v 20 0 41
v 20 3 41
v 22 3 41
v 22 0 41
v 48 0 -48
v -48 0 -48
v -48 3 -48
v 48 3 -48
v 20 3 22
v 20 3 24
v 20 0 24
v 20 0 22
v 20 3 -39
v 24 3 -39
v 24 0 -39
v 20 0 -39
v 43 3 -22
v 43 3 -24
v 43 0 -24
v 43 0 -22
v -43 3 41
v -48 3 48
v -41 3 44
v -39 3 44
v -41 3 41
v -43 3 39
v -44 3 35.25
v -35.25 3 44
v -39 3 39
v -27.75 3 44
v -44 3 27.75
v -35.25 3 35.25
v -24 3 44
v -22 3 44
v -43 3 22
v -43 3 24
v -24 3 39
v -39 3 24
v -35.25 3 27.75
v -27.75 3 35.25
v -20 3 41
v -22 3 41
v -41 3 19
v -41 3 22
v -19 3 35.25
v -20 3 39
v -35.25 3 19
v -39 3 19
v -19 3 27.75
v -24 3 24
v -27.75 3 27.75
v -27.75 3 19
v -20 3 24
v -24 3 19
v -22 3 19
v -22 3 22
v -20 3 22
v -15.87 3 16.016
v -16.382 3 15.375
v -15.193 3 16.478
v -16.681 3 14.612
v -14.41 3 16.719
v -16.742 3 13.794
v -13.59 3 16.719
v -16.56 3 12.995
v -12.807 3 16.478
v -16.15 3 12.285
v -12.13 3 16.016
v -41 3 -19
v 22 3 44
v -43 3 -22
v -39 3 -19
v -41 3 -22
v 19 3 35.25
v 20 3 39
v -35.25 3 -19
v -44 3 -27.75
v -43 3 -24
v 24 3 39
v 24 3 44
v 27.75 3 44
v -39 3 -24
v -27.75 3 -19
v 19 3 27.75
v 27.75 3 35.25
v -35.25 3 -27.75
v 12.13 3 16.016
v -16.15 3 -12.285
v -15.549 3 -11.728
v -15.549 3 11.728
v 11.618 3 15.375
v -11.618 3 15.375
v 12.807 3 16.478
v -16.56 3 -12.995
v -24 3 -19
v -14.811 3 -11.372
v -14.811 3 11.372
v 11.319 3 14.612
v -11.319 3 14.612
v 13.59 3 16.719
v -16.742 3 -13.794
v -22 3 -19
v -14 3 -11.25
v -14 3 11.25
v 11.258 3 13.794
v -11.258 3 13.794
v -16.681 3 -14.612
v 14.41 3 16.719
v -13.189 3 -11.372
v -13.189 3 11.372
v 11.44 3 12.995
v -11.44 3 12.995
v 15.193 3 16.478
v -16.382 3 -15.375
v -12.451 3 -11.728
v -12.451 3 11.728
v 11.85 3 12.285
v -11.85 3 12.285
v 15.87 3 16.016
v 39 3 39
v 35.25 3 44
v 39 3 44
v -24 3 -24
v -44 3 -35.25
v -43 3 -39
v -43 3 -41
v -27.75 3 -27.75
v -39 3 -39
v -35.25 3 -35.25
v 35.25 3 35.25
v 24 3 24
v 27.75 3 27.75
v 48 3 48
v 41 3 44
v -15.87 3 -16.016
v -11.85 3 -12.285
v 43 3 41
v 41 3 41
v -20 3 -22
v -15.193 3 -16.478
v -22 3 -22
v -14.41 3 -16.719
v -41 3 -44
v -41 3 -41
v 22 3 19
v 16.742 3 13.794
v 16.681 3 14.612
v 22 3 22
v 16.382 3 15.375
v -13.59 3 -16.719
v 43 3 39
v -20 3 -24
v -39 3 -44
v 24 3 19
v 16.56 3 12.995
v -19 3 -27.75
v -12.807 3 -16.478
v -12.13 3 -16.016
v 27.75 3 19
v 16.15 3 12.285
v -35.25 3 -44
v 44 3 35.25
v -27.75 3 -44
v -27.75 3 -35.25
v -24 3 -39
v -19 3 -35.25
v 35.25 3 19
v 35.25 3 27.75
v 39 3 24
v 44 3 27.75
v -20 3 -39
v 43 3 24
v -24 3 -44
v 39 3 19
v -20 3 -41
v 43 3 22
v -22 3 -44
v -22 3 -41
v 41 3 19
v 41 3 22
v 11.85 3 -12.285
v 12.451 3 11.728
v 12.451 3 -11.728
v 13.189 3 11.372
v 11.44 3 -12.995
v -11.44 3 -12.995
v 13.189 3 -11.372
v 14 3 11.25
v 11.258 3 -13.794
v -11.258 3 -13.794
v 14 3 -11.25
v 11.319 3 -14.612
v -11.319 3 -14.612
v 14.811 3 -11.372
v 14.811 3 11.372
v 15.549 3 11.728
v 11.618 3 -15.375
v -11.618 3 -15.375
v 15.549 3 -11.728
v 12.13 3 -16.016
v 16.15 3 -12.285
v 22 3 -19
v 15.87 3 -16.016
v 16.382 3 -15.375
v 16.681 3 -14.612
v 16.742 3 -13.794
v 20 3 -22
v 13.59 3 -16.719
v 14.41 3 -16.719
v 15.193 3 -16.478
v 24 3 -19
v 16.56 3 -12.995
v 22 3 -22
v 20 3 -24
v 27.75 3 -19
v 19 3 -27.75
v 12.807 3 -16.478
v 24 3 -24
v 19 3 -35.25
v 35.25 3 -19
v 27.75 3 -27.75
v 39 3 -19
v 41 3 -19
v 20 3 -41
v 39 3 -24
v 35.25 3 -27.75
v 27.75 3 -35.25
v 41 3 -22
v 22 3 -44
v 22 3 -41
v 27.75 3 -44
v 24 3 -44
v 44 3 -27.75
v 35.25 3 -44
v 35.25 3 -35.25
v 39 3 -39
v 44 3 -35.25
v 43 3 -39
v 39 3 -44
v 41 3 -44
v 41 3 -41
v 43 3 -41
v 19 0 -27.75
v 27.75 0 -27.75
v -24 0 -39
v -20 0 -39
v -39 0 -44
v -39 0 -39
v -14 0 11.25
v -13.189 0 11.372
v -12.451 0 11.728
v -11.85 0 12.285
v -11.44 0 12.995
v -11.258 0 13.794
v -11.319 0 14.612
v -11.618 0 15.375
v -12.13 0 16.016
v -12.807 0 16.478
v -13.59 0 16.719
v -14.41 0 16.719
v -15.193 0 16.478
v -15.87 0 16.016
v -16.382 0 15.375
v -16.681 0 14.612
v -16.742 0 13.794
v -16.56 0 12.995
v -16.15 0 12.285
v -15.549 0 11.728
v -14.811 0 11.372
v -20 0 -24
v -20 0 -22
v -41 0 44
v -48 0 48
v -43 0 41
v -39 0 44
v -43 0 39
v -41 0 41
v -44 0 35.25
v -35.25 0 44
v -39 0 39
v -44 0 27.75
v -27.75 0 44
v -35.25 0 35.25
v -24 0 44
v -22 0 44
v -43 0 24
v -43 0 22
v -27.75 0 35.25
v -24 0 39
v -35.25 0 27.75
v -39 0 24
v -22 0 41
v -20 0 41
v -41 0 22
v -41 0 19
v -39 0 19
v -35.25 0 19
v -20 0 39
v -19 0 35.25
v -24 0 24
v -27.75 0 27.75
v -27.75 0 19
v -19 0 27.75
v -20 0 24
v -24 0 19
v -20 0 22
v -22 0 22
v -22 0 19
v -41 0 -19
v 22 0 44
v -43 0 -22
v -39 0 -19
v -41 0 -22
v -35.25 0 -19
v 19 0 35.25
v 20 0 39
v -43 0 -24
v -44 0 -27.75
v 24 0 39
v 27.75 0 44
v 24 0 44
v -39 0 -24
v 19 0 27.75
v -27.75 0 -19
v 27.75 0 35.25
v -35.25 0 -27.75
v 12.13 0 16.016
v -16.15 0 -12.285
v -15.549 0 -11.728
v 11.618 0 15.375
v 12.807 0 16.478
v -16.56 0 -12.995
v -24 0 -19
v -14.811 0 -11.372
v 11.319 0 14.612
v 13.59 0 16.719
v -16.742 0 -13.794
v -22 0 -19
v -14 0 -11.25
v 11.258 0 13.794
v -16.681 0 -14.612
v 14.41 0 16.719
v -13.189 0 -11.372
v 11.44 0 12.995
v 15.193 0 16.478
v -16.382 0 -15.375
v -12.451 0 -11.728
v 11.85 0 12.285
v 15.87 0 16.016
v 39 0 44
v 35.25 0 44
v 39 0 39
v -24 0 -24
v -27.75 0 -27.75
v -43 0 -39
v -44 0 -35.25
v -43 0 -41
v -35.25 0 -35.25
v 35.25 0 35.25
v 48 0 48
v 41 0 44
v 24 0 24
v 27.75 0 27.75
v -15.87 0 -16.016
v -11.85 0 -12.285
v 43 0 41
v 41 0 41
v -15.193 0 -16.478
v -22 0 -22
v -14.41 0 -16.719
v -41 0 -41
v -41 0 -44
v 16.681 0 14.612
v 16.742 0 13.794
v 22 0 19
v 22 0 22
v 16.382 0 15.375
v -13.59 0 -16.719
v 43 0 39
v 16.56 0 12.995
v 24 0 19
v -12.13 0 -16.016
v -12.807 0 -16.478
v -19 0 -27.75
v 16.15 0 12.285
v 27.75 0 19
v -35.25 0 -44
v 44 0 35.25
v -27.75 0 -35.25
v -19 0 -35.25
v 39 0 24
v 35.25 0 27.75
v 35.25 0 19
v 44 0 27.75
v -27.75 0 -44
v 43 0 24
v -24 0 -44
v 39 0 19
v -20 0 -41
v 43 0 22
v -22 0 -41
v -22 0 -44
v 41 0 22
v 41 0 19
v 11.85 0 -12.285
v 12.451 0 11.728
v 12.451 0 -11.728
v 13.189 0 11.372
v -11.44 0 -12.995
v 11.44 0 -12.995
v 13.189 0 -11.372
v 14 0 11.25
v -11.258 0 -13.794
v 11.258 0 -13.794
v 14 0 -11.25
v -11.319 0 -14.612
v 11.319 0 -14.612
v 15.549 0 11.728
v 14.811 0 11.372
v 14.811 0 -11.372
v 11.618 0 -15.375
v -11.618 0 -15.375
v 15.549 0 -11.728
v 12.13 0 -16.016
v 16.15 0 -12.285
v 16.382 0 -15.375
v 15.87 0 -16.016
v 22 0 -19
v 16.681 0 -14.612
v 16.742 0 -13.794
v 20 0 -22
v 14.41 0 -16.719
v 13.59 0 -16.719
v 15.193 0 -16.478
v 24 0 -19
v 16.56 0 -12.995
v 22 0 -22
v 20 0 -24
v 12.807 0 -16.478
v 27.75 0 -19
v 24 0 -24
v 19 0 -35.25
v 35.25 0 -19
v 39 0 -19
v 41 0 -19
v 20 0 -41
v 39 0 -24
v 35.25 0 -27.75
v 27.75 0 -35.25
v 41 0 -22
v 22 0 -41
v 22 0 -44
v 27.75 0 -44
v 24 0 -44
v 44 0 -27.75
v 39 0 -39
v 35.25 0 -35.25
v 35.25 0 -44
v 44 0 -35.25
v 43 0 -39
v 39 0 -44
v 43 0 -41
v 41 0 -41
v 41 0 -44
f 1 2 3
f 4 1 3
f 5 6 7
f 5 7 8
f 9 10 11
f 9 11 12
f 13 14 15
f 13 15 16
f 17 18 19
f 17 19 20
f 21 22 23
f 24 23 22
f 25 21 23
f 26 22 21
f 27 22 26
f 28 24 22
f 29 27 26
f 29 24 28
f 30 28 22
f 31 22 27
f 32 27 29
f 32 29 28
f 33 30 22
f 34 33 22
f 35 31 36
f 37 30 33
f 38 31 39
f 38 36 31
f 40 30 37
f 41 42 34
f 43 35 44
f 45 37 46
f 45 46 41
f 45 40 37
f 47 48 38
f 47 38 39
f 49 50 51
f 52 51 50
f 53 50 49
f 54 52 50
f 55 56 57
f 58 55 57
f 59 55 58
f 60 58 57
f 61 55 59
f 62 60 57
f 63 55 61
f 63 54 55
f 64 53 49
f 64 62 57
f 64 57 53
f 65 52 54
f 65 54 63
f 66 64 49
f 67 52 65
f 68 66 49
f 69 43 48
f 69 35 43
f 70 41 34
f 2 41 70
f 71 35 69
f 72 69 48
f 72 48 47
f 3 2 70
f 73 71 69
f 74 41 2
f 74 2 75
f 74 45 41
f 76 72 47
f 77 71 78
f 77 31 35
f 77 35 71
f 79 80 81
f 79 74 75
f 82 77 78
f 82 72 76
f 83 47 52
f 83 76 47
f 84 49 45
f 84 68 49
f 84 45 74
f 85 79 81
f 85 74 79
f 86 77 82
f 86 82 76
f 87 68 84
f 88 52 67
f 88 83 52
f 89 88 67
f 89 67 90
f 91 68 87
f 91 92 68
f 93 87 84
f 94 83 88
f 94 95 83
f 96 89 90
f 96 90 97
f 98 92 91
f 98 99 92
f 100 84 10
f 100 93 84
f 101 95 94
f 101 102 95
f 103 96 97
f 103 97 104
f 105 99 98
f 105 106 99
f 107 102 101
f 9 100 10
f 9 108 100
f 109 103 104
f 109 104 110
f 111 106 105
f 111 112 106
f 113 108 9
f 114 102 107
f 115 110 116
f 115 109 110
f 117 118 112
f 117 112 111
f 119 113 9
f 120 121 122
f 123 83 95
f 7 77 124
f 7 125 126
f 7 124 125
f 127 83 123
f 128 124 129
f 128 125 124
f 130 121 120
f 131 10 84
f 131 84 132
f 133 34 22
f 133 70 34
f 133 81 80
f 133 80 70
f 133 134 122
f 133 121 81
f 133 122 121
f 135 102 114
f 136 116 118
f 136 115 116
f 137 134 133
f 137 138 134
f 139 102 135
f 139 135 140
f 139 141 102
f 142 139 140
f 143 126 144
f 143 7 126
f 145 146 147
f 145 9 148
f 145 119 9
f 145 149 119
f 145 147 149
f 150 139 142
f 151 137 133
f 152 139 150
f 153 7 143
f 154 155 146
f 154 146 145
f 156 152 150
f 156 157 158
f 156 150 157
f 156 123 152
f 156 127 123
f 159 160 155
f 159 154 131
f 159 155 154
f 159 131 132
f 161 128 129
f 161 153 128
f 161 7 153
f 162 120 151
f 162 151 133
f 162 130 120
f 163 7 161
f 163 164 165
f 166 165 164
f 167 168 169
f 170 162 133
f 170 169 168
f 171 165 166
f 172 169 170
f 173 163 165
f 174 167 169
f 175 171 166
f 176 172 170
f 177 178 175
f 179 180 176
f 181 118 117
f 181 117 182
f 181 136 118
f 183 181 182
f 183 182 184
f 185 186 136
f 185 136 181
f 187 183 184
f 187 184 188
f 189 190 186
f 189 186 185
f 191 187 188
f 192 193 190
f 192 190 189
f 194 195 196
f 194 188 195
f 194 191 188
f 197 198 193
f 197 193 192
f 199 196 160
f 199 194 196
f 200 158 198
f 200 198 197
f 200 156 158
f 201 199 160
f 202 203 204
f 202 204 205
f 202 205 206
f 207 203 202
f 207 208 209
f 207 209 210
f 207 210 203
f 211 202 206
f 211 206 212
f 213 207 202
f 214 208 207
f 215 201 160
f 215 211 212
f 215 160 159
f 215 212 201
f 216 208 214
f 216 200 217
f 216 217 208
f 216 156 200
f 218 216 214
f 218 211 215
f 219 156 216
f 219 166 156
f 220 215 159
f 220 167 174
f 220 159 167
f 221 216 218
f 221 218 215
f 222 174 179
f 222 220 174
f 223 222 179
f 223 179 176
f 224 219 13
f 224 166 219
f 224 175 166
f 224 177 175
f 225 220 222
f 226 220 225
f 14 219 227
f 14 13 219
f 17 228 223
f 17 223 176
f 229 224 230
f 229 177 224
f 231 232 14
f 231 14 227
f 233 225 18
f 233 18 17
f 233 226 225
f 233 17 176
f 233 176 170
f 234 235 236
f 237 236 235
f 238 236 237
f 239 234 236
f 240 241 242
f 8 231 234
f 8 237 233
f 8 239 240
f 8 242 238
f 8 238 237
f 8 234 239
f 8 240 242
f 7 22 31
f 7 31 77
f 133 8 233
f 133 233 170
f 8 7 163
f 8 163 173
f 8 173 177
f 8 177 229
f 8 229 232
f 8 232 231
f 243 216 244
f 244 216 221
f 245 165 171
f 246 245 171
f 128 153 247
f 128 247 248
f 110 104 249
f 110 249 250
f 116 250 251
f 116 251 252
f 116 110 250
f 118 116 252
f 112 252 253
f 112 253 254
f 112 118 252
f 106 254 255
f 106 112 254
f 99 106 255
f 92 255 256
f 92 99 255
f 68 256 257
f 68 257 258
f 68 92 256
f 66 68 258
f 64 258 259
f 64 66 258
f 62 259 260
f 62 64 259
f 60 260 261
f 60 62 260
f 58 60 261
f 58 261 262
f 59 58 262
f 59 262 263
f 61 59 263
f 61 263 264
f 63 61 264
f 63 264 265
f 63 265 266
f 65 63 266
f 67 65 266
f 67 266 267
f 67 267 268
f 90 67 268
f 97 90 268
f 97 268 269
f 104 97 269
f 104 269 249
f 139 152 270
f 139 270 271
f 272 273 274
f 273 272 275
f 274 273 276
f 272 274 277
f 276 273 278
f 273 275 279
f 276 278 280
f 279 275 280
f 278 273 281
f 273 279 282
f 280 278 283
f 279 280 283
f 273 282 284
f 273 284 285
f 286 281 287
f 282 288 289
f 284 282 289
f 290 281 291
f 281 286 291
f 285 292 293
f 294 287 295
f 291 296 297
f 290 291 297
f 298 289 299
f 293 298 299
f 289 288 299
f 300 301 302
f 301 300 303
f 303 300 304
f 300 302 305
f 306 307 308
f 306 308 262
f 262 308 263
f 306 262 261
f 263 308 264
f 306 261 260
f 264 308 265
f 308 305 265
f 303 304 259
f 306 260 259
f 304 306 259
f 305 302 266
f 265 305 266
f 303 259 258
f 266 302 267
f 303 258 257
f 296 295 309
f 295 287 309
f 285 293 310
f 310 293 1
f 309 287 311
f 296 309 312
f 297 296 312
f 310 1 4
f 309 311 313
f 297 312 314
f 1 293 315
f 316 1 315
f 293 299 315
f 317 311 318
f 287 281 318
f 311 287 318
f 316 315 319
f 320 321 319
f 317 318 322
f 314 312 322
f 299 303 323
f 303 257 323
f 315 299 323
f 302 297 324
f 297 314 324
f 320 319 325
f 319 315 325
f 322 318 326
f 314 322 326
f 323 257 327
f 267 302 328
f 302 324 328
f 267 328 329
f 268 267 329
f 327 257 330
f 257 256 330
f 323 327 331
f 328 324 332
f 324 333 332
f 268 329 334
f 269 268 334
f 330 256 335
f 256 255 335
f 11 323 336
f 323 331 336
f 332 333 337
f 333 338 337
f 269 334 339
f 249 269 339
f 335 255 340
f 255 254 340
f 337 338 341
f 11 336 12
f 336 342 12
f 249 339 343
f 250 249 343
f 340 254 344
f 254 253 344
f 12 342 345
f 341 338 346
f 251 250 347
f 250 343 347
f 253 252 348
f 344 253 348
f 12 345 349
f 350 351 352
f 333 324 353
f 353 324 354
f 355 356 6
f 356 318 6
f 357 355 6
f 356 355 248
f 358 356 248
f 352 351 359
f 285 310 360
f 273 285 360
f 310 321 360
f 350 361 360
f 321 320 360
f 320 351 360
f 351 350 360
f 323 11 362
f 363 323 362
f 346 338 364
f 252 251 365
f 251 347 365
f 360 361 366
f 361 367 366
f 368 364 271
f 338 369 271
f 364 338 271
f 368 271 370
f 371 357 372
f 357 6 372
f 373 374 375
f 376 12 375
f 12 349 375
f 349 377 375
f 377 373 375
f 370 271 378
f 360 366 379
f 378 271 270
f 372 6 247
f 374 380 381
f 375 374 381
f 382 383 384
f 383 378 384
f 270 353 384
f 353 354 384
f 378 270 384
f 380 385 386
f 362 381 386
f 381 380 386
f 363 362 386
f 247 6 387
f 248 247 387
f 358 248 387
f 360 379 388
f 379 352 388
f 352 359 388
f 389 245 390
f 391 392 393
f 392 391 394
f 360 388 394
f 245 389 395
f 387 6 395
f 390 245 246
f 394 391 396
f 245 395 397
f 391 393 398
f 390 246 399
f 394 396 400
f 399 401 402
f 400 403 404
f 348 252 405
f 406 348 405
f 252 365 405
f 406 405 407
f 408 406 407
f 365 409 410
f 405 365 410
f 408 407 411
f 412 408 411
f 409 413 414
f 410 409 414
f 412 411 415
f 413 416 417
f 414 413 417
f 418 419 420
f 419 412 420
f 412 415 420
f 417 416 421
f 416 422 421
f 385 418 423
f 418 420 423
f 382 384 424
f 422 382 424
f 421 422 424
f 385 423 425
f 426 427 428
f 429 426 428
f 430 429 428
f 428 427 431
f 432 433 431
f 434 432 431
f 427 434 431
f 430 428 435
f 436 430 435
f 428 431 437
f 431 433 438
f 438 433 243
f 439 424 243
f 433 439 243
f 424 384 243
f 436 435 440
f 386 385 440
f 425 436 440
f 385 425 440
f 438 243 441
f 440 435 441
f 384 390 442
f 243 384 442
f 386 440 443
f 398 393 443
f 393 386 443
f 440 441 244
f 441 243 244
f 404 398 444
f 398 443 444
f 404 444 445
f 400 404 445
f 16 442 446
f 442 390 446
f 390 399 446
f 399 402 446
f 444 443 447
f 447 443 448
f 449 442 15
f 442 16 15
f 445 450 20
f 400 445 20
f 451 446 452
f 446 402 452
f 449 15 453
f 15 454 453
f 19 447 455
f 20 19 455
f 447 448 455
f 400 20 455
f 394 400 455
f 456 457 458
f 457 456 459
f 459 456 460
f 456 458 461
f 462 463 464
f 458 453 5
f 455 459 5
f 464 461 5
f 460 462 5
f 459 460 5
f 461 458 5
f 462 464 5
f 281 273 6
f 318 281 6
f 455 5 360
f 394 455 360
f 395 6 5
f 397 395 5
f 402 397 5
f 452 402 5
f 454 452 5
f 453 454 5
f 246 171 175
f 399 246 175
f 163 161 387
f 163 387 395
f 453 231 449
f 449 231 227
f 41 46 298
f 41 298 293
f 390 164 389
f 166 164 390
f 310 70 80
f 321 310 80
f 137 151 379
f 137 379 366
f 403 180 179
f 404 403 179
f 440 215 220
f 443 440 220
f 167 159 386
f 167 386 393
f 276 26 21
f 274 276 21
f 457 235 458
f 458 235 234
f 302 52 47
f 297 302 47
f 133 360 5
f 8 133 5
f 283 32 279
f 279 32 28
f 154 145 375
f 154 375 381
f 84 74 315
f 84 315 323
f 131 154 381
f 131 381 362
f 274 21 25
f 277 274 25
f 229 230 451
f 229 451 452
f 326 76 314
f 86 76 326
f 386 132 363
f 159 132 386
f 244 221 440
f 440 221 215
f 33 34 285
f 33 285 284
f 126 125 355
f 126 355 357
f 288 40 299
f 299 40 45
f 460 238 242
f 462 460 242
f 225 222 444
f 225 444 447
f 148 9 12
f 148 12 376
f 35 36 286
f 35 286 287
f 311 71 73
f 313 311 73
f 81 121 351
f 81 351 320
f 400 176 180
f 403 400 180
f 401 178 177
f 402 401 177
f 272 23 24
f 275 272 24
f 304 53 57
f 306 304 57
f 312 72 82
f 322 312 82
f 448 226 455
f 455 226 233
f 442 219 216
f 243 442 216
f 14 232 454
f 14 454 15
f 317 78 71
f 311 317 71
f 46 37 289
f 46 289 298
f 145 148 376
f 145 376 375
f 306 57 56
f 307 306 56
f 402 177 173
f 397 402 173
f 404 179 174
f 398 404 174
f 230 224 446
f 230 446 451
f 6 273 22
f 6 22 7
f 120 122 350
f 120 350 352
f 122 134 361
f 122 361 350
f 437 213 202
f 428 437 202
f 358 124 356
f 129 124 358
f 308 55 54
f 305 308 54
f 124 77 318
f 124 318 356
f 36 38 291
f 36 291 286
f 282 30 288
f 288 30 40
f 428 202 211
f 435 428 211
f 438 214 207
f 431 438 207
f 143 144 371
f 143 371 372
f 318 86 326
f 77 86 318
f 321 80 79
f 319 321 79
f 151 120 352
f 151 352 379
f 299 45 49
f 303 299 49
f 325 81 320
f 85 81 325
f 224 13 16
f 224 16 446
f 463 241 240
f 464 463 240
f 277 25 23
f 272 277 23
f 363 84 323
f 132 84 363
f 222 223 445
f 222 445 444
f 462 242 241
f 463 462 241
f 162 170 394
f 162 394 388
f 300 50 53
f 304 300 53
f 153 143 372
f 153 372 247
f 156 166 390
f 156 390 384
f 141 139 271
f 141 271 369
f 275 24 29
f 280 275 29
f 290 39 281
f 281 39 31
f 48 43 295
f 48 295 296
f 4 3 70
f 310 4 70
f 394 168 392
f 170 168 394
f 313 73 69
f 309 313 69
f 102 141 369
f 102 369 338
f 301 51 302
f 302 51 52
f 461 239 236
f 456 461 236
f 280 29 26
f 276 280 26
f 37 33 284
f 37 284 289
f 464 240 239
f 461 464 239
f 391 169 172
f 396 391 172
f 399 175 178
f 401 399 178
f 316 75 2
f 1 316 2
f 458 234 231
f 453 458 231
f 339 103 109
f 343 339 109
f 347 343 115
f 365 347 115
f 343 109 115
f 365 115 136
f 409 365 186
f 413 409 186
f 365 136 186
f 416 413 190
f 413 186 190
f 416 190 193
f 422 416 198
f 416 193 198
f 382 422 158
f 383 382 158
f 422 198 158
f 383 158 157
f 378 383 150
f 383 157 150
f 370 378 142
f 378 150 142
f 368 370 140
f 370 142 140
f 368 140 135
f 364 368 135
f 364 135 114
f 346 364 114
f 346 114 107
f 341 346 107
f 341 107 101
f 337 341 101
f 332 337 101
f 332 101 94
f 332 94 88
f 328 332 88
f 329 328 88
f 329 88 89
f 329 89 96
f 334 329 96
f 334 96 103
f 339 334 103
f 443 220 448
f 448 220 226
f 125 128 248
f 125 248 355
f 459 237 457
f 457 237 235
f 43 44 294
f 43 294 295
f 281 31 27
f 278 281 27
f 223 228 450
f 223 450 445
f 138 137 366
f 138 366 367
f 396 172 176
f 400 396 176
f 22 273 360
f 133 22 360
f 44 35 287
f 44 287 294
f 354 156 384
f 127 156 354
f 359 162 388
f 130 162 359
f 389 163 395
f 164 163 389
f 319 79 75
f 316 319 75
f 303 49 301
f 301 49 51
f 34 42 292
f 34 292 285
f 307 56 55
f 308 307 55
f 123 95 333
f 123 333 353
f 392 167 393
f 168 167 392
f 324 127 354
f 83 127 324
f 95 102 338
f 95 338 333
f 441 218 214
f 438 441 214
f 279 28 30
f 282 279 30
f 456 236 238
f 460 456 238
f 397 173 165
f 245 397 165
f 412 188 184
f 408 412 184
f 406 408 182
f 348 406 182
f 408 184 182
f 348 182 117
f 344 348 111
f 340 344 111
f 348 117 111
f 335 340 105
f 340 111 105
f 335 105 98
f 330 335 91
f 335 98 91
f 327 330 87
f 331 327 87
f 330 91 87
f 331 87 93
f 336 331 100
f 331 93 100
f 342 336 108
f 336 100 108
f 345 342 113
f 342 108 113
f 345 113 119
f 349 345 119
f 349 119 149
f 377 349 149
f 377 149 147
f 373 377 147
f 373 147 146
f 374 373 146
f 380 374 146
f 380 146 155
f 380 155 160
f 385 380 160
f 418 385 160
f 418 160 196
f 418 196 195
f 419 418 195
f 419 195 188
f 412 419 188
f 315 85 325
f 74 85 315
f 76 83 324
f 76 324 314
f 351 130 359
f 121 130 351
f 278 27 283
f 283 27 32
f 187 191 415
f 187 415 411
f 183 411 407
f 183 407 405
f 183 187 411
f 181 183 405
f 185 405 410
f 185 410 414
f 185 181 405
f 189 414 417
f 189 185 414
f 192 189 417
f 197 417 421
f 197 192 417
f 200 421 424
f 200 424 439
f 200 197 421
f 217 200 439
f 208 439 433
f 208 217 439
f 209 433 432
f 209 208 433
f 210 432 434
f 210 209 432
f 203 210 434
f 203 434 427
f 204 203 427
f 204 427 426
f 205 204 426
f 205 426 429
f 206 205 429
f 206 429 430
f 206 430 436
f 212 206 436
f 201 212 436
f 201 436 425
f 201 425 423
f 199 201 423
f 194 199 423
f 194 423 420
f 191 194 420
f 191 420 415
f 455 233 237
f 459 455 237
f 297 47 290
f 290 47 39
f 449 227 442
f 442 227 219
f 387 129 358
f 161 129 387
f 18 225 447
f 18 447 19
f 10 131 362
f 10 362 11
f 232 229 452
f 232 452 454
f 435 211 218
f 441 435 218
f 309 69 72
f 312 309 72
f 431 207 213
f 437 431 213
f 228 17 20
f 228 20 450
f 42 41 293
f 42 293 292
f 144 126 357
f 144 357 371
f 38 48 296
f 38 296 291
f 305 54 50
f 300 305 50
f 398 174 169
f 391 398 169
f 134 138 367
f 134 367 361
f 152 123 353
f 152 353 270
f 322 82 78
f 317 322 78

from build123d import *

# Parameters (mm, degrees)
SKETCH_1_W               = 96
SKETCH_1_H               = 96
EXTRUDE_1_DEPTH          = 3
CUT_EXTRUDE_1_REACH      = 69.949
SKETCH_3_R               = 2.75
MIRROR_2_COPY_1_REACH    = 69.949
MIRROR_2_COPY_1_SKETCH_R = 2.75


with BuildPart() as part:
    # 草图1 → 凸台-拉伸1 (new body)
    with BuildSketch(Plane(origin=(0, 0, 0), x_dir=(1, 0, 0), z_dir=(0, 1, 0))):
        Rectangle(SKETCH_1_W, SKETCH_1_H)
    extrude(amount=EXTRUDE_1_DEPTH)

    # 草图3 → 切除-拉伸1 (cut, up to next)
    with BuildSketch(Plane(origin=(0, 3, 0), x_dir=(1, 0, 0), z_dir=(0, 1, 0)), mode=Mode.PRIVATE) as cut_extrude_1_sk1:
        with Locations(Location((-14, 14, 0), (0, 0, 270))):
            Circle(SKETCH_3_R)
    cut_extrude_1_tool1 = extrude(cut_extrude_1_sk1.sketch, amount=-CUT_EXTRUDE_1_REACH, mode=Mode.PRIVATE) & part.part
    # 草图3 → 切除-拉伸1 (cut, up to next)
    with BuildSketch(Plane(origin=(0, 3, 0), x_dir=(1, 0, 0), z_dir=(0, 1, 0)), mode=Mode.PRIVATE) as cut_extrude_1_sk2:
        Polygon((-27.75, 35.25), (-19, 35.25), (-19, 27.75), (-27.75, 27.75), (-27.75, 19), (-35.25, 19), (-35.25, 27.75), (-44, 27.75), (-44, 35.25), (-35.25, 35.25), (-35.25, 44), (-27.75, 44), align=None)
    cut_extrude_1_tool2 = extrude(cut_extrude_1_sk2.sketch, amount=-CUT_EXTRUDE_1_REACH, mode=Mode.PRIVATE) & part.part
    # 草图3 → 切除-拉伸1 (cut, up to next)
    with BuildSketch(Plane(origin=(0, 3, 0), x_dir=(1, 0, 0), z_dir=(0, 1, 0)), mode=Mode.PRIVATE) as cut_extrude_1_sk3:
        Polygon((-41, 44), (-39, 44), (-39, 39), (-43, 39), (-43, 41), (-41, 41), align=None)
    cut_extrude_1_tool3 = extrude(cut_extrude_1_sk3.sketch, amount=-CUT_EXTRUDE_1_REACH, mode=Mode.PRIVATE) & part.part
    # 草图3 → 切除-拉伸1 (cut, up to next)
    with BuildSketch(Plane(origin=(0, 3, 0), x_dir=(1, 0, 0), z_dir=(0, 1, 0)), mode=Mode.PRIVATE) as cut_extrude_1_sk4:
        Polygon((-22, 41), (-22, 44), (-24, 44), (-24, 39), (-20, 39), (-20, 41), align=None)
    cut_extrude_1_tool4 = extrude(cut_extrude_1_sk4.sketch, amount=-CUT_EXTRUDE_1_REACH, mode=Mode.PRIVATE) & part.part
    # 草图3 → 切除-拉伸1 (cut, up to next)
    with BuildSketch(Plane(origin=(0, 3, 0), x_dir=(1, 0, 0), z_dir=(0, 1, 0)), mode=Mode.PRIVATE) as cut_extrude_1_sk5:
        Polygon((-22, 19), (-24, 19), (-24, 24), (-20, 24), (-20, 22), (-22, 22), align=None)
    cut_extrude_1_tool5 = extrude(cut_extrude_1_sk5.sketch, amount=-CUT_EXTRUDE_1_REACH, mode=Mode.PRIVATE) & part.part
    # 草图3 → 切除-拉伸1 (cut, up to next)
    with BuildSketch(Plane(origin=(0, 3, 0), x_dir=(1, 0, 0), z_dir=(0, 1, 0)), mode=Mode.PRIVATE) as cut_extrude_1_sk6:
        Polygon((-41, 22), (-41, 19), (-39, 19), (-39, 24), (-43, 24), (-43, 22), align=None)
    cut_extrude_1_tool6 = extrude(cut_extrude_1_sk6.sketch, amount=-CUT_EXTRUDE_1_REACH, mode=Mode.PRIVATE) & part.part
    cut_extrude_1_1 = cut_extrude_1_tool1.solids().sort_by_distance((-14, 3, -14))[0]
    add(cut_extrude_1_1, mode=Mode.SUBTRACT)
    cut_extrude_1_2 = cut_extrude_1_tool2.solids().sort_by_distance((-31.5, 3, -31.5))[0]
    add(cut_extrude_1_2, mode=Mode.SUBTRACT)
    cut_extrude_1_3 = cut_extrude_1_tool3.solids().sort_by_distance((-40.571429, 3, -41.071429))[0]
    add(cut_extrude_1_3, mode=Mode.SUBTRACT)
    cut_extrude_1_4 = cut_extrude_1_tool4.solids().sort_by_distance((-22.428571, 3, -41.071429))[0]
    add(cut_extrude_1_4, mode=Mode.SUBTRACT)
    cut_extrude_1_5 = cut_extrude_1_tool5.solids().sort_by_distance((-22.428571, 3, -21.928571))[0]
    add(cut_extrude_1_5, mode=Mode.SUBTRACT)
    cut_extrude_1_6 = cut_extrude_1_tool6.solids().sort_by_distance((-40.571429, 3, -21.928571))[0]
    add(cut_extrude_1_6, mode=Mode.SUBTRACT)
    cut_extrude_1 = cut_extrude_1_1 + cut_extrude_1_2 + cut_extrude_1_3 + cut_extrude_1_4 + cut_extrude_1_5 + cut_extrude_1_6  # 切除-拉伸1 as one shape, for the pattern or mirror that repeats it

    # 镜向1: 切除-拉伸1 across plane
    add(cut_extrude_1.mirror(Plane(origin=(0, 0, 0), x_dir=(0, 0, 1), z_dir=(1, 0, 0))), mode=Mode.SUBTRACT)

    # 镜向2: 切除-拉伸1 across plane
    add(cut_extrude_1.mirror(Plane.XY), mode=Mode.SUBTRACT)

    # 镜向2 copy 1 sketch → 镜向2 copy 1 (cut, up to next)
    with BuildSketch(Plane(origin=(0, 3, 0), x_dir=(-1, 0, 0), z_dir=(0, 1, 0)), mode=Mode.PRIVATE) as mirror_2_copy_1_sk1:
        with Locations(Location((-14, 14, 0), (0, 0, 270))):
            Circle(MIRROR_2_COPY_1_SKETCH_R)
    mirror_2_copy_1_tool1 = extrude(mirror_2_copy_1_sk1.sketch, amount=-MIRROR_2_COPY_1_REACH, mode=Mode.PRIVATE) & part.part
    # 镜向2 copy 1 sketch → 镜向2 copy 1 (cut, up to next)
    with BuildSketch(Plane(origin=(0, 3, 0), x_dir=(-1, 0, 0), z_dir=(0, 1, 0)), mode=Mode.PRIVATE) as mirror_2_copy_1_sk2:
        Polygon((-27.75, 35.25), (-19, 35.25), (-19, 27.75), (-27.75, 27.75), (-27.75, 19), (-35.25, 19), (-35.25, 27.75), (-44, 27.75), (-44, 35.25), (-35.25, 35.25), (-35.25, 44), (-27.75, 44), align=None)
    mirror_2_copy_1_tool2 = extrude(mirror_2_copy_1_sk2.sketch, amount=-MIRROR_2_COPY_1_REACH, mode=Mode.PRIVATE) & part.part
    # 镜向2 copy 1 sketch → 镜向2 copy 1 (cut, up to next)
    with BuildSketch(Plane(origin=(0, 3, 0), x_dir=(-1, 0, 0), z_dir=(0, 1, 0)), mode=Mode.PRIVATE) as mirror_2_copy_1_sk3:
        Polygon((-41, 44), (-39, 44), (-39, 39), (-43, 39), (-43, 41), (-41, 41), align=None)
    mirror_2_copy_1_tool3 = extrude(mirror_2_copy_1_sk3.sketch, amount=-MIRROR_2_COPY_1_REACH, mode=Mode.PRIVATE) & part.part
    # 镜向2 copy 1 sketch → 镜向2 copy 1 (cut, up to next)
    with BuildSketch(Plane(origin=(0, 3, 0), x_dir=(-1, 0, 0), z_dir=(0, 1, 0)), mode=Mode.PRIVATE) as mirror_2_copy_1_sk4:
        Polygon((-22, 41), (-22, 44), (-24, 44), (-24, 39), (-20, 39), (-20, 41), align=None)
    mirror_2_copy_1_tool4 = extrude(mirror_2_copy_1_sk4.sketch, amount=-MIRROR_2_COPY_1_REACH, mode=Mode.PRIVATE) & part.part
    # 镜向2 copy 1 sketch → 镜向2 copy 1 (cut, up to next)
    with BuildSketch(Plane(origin=(0, 3, 0), x_dir=(-1, 0, 0), z_dir=(0, 1, 0)), mode=Mode.PRIVATE) as mirror_2_copy_1_sk5:
        Polygon((-22, 19), (-24, 19), (-24, 24), (-20, 24), (-20, 22), (-22, 22), align=None)
    mirror_2_copy_1_tool5 = extrude(mirror_2_copy_1_sk5.sketch, amount=-MIRROR_2_COPY_1_REACH, mode=Mode.PRIVATE) & part.part
    # 镜向2 copy 1 sketch → 镜向2 copy 1 (cut, up to next)
    with BuildSketch(Plane(origin=(0, 3, 0), x_dir=(-1, 0, 0), z_dir=(0, 1, 0)), mode=Mode.PRIVATE) as mirror_2_copy_1_sk6:
        Polygon((-41, 22), (-41, 19), (-39, 19), (-39, 24), (-43, 24), (-43, 22), align=None)
    mirror_2_copy_1_tool6 = extrude(mirror_2_copy_1_sk6.sketch, amount=-MIRROR_2_COPY_1_REACH, mode=Mode.PRIVATE) & part.part
    add(mirror_2_copy_1_tool1.solids().sort_by_distance((14, 3, 14))[0], mode=Mode.SUBTRACT)
    add(mirror_2_copy_1_tool2.solids().sort_by_distance((31.5, 3, 31.5))[0], mode=Mode.SUBTRACT)
    add(mirror_2_copy_1_tool3.solids().sort_by_distance((40.571429, 3, 41.071429))[0], mode=Mode.SUBTRACT)
    add(mirror_2_copy_1_tool4.solids().sort_by_distance((22.428571, 3, 41.071429))[0], mode=Mode.SUBTRACT)
    add(mirror_2_copy_1_tool5.solids().sort_by_distance((22.428571, 3, 21.928571))[0], mode=Mode.SUBTRACT)
    add(mirror_2_copy_1_tool6.solids().sort_by_distance((40.571429, 3, 21.928571))[0], mode=Mode.SUBTRACT)


solid = part.part
